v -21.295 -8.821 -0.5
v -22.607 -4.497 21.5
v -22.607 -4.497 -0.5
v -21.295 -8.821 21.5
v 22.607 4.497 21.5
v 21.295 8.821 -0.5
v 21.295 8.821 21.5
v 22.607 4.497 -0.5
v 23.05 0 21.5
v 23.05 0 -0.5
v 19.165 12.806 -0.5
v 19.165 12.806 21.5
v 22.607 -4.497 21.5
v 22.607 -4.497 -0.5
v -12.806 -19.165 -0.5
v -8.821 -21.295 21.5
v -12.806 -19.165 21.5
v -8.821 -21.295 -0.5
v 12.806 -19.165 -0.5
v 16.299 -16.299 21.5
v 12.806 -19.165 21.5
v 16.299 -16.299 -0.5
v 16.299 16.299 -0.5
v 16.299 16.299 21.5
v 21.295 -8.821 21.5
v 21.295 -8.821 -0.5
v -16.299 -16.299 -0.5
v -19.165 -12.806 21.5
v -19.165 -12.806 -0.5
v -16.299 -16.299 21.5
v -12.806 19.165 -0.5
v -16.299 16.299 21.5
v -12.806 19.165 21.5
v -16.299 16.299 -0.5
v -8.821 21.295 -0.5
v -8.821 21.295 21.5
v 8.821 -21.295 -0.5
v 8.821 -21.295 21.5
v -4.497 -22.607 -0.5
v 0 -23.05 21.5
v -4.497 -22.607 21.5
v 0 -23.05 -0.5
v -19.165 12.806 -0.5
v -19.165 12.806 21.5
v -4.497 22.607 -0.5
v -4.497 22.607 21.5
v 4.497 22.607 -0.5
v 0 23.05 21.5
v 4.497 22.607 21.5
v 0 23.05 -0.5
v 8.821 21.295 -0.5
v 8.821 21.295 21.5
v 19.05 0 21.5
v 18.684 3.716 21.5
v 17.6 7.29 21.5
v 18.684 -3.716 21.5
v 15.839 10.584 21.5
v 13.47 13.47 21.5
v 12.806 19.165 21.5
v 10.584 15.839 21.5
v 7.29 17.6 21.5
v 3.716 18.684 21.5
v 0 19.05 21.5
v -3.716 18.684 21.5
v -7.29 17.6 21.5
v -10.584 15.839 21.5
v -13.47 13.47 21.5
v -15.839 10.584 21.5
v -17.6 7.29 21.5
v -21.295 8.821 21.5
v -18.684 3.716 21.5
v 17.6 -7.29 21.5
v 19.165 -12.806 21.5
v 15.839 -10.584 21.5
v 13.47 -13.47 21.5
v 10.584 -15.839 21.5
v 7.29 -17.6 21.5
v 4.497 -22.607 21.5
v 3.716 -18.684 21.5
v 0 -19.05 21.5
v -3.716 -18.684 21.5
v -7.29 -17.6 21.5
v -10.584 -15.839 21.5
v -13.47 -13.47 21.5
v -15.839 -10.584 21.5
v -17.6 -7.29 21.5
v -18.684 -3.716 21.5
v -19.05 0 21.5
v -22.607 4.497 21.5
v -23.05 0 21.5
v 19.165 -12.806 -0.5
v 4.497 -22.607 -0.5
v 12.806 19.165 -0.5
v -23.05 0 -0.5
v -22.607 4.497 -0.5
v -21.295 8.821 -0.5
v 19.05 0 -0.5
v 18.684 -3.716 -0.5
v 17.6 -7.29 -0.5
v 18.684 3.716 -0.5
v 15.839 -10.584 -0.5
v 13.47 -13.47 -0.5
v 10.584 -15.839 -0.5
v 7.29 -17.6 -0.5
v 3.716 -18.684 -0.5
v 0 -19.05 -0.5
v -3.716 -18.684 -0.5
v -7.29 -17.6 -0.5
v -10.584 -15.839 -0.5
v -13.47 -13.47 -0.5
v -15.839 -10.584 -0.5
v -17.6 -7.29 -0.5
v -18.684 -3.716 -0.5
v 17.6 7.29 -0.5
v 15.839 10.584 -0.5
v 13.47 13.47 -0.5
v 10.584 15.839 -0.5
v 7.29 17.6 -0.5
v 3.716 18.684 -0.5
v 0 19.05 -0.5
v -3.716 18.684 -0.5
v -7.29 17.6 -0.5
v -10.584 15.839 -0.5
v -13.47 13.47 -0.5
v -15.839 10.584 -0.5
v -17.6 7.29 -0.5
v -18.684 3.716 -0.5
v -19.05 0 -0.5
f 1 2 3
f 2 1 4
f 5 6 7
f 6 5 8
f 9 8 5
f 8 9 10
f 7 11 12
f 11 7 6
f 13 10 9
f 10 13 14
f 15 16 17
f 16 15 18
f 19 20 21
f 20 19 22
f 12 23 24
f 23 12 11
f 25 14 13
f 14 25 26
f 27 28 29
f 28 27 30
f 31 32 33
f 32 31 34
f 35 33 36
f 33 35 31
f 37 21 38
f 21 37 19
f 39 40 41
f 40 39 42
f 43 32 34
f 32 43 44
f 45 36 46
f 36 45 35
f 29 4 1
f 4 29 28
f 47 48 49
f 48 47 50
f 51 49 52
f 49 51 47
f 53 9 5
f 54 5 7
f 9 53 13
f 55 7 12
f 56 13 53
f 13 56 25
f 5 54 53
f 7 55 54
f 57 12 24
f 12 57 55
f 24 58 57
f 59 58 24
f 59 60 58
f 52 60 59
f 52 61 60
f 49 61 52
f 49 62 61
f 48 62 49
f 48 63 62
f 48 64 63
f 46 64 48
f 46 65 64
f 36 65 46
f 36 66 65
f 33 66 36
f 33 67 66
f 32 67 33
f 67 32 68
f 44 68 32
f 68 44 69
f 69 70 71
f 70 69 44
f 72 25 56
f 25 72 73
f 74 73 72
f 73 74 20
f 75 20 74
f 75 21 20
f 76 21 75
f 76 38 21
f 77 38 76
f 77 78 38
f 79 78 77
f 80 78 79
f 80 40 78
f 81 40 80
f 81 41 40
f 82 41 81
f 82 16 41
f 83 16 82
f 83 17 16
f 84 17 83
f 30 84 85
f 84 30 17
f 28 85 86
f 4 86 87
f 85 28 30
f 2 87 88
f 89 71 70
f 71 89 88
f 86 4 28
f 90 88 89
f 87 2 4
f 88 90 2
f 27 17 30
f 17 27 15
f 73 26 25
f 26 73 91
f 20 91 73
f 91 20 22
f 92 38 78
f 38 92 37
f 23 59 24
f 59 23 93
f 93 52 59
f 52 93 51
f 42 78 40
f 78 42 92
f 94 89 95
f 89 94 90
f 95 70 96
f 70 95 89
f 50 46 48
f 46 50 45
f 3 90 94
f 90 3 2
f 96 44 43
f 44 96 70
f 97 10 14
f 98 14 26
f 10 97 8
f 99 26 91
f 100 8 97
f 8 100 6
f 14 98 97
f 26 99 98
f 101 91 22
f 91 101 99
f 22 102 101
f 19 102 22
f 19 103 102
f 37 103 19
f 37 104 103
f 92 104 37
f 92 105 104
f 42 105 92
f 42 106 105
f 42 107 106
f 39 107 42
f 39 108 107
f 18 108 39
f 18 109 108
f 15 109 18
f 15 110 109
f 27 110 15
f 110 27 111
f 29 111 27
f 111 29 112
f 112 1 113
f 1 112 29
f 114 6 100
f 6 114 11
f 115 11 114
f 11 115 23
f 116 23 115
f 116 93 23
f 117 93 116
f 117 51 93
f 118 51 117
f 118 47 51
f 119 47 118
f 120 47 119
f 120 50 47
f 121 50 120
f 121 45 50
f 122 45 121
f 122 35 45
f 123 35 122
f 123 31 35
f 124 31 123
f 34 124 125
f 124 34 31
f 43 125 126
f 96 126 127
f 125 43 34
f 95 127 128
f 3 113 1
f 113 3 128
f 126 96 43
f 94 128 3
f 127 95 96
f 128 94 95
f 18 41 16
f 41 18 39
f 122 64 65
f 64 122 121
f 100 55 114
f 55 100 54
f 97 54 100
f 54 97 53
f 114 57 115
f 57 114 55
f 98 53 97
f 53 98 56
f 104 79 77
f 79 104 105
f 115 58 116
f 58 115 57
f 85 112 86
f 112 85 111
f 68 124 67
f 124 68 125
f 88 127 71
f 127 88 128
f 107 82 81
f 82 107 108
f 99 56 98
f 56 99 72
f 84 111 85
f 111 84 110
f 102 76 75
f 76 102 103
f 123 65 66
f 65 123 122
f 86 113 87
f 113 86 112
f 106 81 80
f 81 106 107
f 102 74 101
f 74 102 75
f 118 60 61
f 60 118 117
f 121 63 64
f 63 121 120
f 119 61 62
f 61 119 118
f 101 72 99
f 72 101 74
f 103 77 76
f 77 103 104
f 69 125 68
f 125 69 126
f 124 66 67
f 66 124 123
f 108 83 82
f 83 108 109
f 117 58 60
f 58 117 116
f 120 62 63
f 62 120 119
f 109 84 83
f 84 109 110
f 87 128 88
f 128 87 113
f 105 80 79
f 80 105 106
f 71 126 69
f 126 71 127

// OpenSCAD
$fn = 32;

// ----------------------------------------------------------------------
// Two-module gear rim: z12 m2 and z12 m2, 21 mm wide
// ----------------------------------------------------------------------

// --- parameters (mm) ---
module_a = 2;             // first tooth module
teeth_a = 12;             // first band tooth count
module_b = 2;             // second tooth module
teeth_b = 12;             // second band tooth count
band_h = 8;               // height of one tooth band
web_t = 5;                // web thickness between the bands
total = 21;               // overall width over both bands
root_r = 9.5;             // root radius of the coarse band
hub_r = 23.05;            // hub radius
bore_d = 38.1;            // hub bore
hole_count = 6;           // lightening holes
hole_r = 7.75;            // lightening hole circle radius
hole_d = 4;               // lightening hole diameter

band_a = [[9.4, -1.378], [12.124, -1.51], [13.058, -1.154], [13.986, -0.621], [13.986, 0.621], [13.058, 1.154], [12.124, 1.51], [9.4, 1.378], [8.829, 3.507], [11.254, 4.755], [11.885, 5.53], [12.423, 6.456], [11.802, 7.531], [10.732, 7.528], [9.745, 7.369], [7.451, 5.893], [5.893, 7.451], [7.369, 9.745], [7.528, 10.732], [7.531, 11.802], [6.456, 12.423], [5.53, 11.885], [4.755, 11.254], [3.507, 8.829], [1.378, 9.4], [1.51, 12.124], [1.154, 13.058], [0.621, 13.986], [-0.621, 13.986], [-1.154, 13.058], [-1.51, 12.124], [-1.378, 9.4], [-3.507, 8.829], [-4.755, 11.254], [-5.53, 11.885], [-6.456, 12.423], [-7.531, 11.802], [-7.528, 10.732], [-7.369, 9.745], [-5.893, 7.451], [-7.451, 5.893], [-9.745, 7.369], [-10.732, 7.528], [-11.802, 7.531], [-12.423, 6.456], [-11.885, 5.53], [-11.254, 4.755], [-8.829, 3.507], [-9.4, 1.378], [-12.124, 1.51], [-13.058, 1.154], [-13.986, 0.621], [-13.986, -0.621], [-13.058, -1.154], [-12.124, -1.51], [-9.4, -1.378], [-8.829, -3.507], [-11.254, -4.755], [-11.885, -5.53], [-12.423, -6.456], [-11.802, -7.531], [-10.732, -7.528], [-9.745, -7.369], [-7.451, -5.893], [-5.893, -7.451], [-7.369, -9.745], [-7.528, -10.732], [-7.531, -11.802], [-6.456, -12.423], [-5.53, -11.885], [-4.755, -11.254], [-3.507, -8.829], [-1.378, -9.4], [-1.51, -12.124], [-1.154, -13.058], [-0.621, -13.986], [0.621, -13.986], [1.154, -13.058], [1.51, -12.124], [1.378, -9.4], [3.507, -8.829], [4.755, -11.254], [5.53, -11.885], [6.456, -12.423], [7.531, -11.802], [7.528, -10.732], [7.369, -9.745], [5.893, -7.451], [7.451, -5.893], [9.745, -7.369], [10.732, -7.528], [11.802, -7.531], [12.423, -6.456], [11.885, -5.53], [11.254, -4.755], [8.829, -3.507]];
band_b = [[9.4, -1.378], [12.124, -1.51], [13.058, -1.154], [13.986, -0.621], [13.986, 0.621], [13.058, 1.154], [12.124, 1.51], [9.4, 1.378], [8.829, 3.507], [11.254, 4.755], [11.885, 5.53], [12.423, 6.456], [11.802, 7.531], [10.732, 7.528], [9.745, 7.369], [7.451, 5.893], [5.893, 7.451], [7.369, 9.745], [7.528, 10.732], [7.531, 11.802], [6.456, 12.423], [5.53, 11.885], [4.755, 11.254], [3.507, 8.829], [1.378, 9.4], [1.51, 12.124], [1.154, 13.058], [0.621, 13.986], [-0.621, 13.986], [-1.154, 13.058], [-1.51, 12.124], [-1.378, 9.4], [-3.507, 8.829], [-4.755, 11.254], [-5.53, 11.885], [-6.456, 12.423], [-7.531, 11.802], [-7.528, 10.732], [-7.369, 9.745], [-5.893, 7.451], [-7.451, 5.893], [-9.745, 7.369], [-10.732, 7.528], [-11.802, 7.531], [-12.423, 6.456], [-11.885, 5.53], [-11.254, 4.755], [-8.829, 3.507], [-9.4, 1.378], [-12.124, 1.51], [-13.058, 1.154], [-13.986, 0.621], [-13.986, -0.621], [-13.058, -1.154], [-12.124, -1.51], [-9.4, -1.378], [-8.829, -3.507], [-11.254, -4.755], [-11.885, -5.53], [-12.423, -6.456], [-11.802, -7.531], [-10.732, -7.528], [-9.745, -7.369], [-7.451, -5.893], [-5.893, -7.451], [-7.369, -9.745], [-7.528, -10.732], [-7.531, -11.802], [-6.456, -12.423], [-5.53, -11.885], [-4.755, -11.254], [-3.507, -8.829], [-1.378, -9.4], [-1.51, -12.124], [-1.154, -13.058], [-0.621, -13.986], [0.621, -13.986], [1.154, -13.058], [1.51, -12.124], [1.378, -9.4], [3.507, -8.829], [4.755, -11.254], [5.53, -11.885], [6.456, -12.423], [7.531, -11.802], [7.528, -10.732], [7.369, -9.745], [5.893, -7.451], [7.451, -5.893], [9.745, -7.369], [10.732, -7.528], [11.802, -7.531], [12.423, -6.456], [11.885, -5.53], [11.254, -4.755], [8.829, -3.507]];

difference() {
  union() {
    /* tooth band A, overlapping the web by 0.4 mm */
    linear_extrude(height = band_h + 0.4) polygon(band_a);
    /* web */
    translate([0, 0, band_h - 0.4]) cylinder(h = web_t + 0.8, d = 2 * root_r);
    /* tooth band B */
    translate([0, 0, band_h + web_t]) linear_extrude(height = band_h + 0.4) polygon(band_b);
    /* hub */
    translate([0, 0, -0.5]) cylinder(h = total + 1.0, d = 2 * hub_r);
  }
  /* bore */
  translate([0, 0, -2.5]) cylinder(h = total + 5, d = bore_d);
  /* lightening holes through the web */
  for (i = [0 : hole_count - 1]) {
    a = i * 360 / hole_count;
    translate([hole_r * cos(a), hole_r * sin(a), -2.5]) cylinder(h = total + 5, d = hole_d);
  }
}
